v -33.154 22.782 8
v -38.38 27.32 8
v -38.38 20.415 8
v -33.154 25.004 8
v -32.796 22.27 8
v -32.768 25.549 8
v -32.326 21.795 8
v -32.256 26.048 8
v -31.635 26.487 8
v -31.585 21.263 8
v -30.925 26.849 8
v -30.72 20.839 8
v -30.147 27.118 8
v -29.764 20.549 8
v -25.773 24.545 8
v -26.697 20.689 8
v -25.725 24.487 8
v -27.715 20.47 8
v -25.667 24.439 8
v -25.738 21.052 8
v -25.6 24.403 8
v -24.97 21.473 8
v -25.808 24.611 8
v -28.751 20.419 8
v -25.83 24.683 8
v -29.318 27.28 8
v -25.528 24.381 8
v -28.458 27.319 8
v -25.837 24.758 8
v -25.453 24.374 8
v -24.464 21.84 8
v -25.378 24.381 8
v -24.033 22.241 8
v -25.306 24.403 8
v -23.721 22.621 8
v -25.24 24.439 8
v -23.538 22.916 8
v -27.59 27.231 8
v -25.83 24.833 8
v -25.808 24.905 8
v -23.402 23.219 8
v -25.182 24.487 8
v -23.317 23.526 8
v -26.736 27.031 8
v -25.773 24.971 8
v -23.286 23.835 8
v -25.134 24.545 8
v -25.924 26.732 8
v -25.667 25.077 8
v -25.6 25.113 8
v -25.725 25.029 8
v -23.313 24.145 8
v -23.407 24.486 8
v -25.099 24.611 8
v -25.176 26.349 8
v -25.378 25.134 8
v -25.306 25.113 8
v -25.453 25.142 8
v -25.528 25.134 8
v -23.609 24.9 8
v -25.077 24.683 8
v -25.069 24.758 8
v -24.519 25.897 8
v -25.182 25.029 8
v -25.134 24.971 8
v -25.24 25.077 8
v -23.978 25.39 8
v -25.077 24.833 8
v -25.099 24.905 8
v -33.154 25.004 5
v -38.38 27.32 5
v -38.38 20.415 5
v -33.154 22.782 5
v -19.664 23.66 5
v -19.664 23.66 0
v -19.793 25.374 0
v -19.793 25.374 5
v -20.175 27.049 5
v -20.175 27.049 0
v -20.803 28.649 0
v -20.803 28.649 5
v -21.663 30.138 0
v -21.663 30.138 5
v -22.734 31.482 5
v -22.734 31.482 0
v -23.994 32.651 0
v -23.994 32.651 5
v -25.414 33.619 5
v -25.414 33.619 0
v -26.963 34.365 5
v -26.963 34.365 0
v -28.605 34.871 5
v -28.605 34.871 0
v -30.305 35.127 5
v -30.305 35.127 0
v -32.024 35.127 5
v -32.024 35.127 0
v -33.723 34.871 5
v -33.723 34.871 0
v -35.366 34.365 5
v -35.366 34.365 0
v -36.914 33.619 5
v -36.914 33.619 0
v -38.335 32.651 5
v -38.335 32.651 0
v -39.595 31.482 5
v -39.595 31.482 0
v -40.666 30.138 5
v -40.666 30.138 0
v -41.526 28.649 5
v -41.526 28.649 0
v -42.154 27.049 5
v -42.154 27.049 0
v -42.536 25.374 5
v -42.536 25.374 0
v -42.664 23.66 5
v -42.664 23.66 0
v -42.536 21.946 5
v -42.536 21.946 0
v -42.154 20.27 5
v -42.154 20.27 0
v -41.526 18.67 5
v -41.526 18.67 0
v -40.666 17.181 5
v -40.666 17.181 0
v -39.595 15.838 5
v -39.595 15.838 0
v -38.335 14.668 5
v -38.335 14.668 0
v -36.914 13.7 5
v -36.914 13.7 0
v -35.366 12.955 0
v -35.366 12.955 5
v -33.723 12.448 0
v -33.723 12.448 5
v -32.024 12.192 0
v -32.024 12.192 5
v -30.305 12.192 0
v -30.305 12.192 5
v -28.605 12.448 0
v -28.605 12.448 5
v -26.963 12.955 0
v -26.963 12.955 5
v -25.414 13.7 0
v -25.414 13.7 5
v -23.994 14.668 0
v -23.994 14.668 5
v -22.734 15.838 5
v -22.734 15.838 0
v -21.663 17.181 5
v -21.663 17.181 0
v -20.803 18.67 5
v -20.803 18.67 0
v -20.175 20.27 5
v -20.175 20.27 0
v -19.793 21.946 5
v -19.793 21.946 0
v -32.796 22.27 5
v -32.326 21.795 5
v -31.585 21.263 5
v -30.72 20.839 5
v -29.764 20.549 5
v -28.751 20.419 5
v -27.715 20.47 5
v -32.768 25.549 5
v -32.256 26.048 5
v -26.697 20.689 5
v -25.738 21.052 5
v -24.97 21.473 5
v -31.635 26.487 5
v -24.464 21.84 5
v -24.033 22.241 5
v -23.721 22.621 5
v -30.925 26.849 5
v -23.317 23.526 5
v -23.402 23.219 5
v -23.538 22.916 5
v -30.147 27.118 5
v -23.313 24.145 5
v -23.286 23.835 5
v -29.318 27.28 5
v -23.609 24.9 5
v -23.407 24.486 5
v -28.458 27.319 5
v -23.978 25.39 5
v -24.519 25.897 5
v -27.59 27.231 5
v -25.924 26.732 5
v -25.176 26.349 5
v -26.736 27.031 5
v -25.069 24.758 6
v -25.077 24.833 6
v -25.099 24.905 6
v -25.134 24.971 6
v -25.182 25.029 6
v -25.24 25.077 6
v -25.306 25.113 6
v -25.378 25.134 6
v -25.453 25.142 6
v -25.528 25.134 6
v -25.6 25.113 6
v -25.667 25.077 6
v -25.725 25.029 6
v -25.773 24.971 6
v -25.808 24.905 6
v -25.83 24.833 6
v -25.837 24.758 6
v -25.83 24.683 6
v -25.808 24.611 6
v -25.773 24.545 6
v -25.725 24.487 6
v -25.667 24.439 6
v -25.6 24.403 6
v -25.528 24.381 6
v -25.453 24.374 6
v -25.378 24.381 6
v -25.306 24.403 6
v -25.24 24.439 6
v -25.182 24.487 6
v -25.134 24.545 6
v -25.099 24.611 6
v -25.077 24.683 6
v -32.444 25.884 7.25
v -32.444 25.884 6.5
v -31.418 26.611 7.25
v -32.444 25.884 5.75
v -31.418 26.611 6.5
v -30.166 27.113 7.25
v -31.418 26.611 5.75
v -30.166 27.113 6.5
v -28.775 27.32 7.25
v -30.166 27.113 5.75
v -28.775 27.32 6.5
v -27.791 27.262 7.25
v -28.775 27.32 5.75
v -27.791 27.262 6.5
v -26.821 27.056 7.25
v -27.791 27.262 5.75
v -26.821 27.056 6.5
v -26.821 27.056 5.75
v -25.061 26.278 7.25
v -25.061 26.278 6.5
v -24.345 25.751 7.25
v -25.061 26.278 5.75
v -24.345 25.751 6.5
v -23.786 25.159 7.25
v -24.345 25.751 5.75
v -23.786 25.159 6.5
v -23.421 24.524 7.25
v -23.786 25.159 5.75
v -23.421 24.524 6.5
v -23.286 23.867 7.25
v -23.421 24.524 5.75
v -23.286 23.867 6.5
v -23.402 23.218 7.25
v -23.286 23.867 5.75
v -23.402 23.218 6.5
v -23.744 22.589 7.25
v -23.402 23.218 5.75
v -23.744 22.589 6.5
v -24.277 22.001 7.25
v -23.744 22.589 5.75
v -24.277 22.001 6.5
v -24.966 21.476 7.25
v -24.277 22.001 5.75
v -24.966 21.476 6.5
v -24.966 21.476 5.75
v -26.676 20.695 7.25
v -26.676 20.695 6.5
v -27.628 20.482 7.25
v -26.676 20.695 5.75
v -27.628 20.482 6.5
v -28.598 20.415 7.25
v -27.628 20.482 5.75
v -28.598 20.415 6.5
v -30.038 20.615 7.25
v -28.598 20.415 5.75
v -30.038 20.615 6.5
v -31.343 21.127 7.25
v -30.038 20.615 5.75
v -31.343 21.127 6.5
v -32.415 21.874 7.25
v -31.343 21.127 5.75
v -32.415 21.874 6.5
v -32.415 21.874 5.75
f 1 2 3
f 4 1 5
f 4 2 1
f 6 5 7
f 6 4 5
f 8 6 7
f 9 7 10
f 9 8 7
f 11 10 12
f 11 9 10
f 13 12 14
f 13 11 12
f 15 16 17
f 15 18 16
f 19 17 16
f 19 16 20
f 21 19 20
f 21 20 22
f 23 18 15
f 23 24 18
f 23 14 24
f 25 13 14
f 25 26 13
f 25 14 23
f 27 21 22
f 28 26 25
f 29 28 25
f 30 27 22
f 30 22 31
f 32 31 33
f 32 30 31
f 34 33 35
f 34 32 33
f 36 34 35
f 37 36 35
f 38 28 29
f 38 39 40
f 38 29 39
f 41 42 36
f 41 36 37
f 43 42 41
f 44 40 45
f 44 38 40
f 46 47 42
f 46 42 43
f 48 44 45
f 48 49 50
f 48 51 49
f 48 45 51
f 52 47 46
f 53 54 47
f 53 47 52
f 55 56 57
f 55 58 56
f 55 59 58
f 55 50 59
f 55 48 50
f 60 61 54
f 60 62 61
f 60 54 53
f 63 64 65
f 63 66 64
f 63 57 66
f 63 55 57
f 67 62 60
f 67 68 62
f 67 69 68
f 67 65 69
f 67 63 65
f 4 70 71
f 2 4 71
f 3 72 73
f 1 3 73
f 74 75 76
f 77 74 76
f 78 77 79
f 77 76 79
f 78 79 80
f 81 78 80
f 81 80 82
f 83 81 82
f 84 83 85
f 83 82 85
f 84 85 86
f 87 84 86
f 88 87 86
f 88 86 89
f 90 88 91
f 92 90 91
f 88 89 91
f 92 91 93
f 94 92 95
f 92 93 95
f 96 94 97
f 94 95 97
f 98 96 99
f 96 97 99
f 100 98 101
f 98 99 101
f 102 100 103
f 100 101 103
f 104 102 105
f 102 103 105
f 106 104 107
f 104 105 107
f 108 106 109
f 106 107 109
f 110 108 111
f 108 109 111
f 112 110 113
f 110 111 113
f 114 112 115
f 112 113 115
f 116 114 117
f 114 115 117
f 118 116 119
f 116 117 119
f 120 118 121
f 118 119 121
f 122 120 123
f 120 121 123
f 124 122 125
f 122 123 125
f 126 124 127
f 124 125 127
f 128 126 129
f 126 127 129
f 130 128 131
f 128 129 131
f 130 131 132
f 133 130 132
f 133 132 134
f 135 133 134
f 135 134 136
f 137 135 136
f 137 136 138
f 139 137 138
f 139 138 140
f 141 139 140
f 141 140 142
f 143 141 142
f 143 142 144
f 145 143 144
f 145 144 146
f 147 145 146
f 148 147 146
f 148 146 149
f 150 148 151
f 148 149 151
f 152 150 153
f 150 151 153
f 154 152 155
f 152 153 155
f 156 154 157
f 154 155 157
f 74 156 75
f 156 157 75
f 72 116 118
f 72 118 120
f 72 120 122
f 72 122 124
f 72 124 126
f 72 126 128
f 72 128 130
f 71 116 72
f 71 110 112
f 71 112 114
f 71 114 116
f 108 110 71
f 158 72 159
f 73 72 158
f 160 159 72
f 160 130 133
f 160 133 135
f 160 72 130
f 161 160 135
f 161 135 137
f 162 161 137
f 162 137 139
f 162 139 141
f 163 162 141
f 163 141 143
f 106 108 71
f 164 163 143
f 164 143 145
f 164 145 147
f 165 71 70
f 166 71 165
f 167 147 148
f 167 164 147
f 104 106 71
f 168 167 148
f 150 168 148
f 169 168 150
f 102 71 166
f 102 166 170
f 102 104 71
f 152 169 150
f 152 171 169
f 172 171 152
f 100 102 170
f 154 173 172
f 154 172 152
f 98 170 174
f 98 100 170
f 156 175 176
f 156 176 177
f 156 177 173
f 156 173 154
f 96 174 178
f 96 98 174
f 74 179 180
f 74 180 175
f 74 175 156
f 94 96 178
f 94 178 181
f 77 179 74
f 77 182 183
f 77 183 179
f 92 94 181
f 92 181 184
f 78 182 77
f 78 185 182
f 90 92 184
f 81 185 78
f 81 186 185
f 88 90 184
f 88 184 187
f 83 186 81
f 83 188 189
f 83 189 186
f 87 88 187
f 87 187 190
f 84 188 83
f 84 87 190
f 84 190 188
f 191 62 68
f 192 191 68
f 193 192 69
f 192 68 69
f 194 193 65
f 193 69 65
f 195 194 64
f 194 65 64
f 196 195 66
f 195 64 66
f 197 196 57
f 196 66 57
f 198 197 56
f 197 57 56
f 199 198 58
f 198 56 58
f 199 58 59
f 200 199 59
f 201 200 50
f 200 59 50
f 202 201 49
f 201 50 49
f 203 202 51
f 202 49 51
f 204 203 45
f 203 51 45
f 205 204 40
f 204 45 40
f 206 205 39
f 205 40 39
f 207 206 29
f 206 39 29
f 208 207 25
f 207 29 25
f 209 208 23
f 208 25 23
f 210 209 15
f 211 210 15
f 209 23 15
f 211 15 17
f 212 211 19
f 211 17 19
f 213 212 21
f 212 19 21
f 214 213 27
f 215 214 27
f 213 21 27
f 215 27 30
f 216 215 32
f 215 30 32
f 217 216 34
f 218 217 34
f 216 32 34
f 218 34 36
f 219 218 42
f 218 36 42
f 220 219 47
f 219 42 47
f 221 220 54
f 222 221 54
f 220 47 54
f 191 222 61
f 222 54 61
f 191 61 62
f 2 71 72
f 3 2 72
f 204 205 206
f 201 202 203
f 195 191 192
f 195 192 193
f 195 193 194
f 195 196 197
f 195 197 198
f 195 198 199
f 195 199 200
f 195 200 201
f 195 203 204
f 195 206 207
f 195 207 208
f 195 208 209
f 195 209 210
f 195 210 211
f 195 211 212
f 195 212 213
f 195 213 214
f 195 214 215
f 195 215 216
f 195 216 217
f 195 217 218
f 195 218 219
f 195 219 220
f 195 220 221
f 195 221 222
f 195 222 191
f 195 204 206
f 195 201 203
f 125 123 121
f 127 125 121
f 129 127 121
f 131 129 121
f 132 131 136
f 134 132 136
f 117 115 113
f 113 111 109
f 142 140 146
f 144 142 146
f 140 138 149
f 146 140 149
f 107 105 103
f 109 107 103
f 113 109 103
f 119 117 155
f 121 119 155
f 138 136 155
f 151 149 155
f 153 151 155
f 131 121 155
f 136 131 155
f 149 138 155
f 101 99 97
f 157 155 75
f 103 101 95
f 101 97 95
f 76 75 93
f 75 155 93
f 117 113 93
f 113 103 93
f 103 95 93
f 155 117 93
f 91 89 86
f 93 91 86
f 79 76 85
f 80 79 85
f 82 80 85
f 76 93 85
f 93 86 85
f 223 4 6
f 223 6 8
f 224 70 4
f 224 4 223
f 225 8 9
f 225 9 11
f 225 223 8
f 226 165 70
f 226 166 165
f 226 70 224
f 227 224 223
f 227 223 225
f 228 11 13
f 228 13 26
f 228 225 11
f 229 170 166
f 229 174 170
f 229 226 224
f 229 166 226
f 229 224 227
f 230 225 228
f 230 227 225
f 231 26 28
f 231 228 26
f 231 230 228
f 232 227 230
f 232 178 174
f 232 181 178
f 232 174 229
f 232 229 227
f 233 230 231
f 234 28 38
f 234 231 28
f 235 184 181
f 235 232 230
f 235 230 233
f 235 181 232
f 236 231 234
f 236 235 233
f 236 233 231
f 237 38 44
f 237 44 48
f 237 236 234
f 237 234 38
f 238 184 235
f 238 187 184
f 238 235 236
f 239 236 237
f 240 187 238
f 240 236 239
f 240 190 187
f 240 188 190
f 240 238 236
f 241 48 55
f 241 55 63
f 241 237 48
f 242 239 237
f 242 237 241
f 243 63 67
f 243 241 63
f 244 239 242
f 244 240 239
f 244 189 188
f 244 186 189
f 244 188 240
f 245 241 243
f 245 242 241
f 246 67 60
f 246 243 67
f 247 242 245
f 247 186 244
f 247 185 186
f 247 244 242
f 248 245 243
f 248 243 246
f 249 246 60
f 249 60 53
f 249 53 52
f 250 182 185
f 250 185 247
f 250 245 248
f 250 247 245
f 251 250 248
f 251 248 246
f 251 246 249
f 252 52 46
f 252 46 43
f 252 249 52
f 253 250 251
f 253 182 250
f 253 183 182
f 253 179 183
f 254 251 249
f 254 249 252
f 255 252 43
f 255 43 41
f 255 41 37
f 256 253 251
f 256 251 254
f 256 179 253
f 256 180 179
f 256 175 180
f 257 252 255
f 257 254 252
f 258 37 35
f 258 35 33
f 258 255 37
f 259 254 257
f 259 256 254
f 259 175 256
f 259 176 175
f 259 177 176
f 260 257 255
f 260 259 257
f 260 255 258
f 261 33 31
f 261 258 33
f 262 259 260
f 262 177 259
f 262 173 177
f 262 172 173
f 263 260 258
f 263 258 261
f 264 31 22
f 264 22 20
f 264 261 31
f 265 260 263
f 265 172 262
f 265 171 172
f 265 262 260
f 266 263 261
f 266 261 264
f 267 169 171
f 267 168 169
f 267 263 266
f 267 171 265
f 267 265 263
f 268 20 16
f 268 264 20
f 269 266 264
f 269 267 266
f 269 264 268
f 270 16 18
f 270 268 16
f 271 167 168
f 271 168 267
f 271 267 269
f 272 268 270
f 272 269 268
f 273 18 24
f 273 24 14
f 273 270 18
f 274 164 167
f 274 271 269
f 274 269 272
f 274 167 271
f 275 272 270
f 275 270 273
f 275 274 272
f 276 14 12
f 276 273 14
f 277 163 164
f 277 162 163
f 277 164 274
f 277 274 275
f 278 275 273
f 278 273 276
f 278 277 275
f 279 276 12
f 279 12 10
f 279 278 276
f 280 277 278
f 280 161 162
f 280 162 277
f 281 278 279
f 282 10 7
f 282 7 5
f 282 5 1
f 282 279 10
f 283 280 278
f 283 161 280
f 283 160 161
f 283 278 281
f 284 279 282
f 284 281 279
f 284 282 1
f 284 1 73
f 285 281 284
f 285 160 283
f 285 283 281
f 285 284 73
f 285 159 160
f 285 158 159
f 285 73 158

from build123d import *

# Parameters (mm, degrees)
F0_R     = 11.5
F1_DEPTH = 5
F3_DEPTH = 3
F4_R     = 0.3838948085
F5_DEPTH = 2


with BuildPart() as f1:
    # F0 (on Top) → F1 (new body)
    with BuildSketch(Plane.XY):
        with Locations((-31.1644673347, 23.6595552415)):
            Circle(F0_R)
    extrude(amount=F1_DEPTH)

    # F2 (on face) → F3 (join)
    with BuildSketch(Plane.XY.offset(5)):
        with BuildLine():
            add(Edge.make_bspline(
                [(-33.1539588035, 22.7823868875), (-33.3507914741, 23.1327616424), (-33.4622053799, 23.4998701067), (-33.4669202566, 23.8672532141)],
                knots=[0.9471889438, 0.9471889438, 0.9471889438, 0.9471889438, 1, 1, 1, 1], degree=3))
            add(Edge.make_bspline(
                [(-33.4669202566, 23.8672532141), (-33.47186302, 24.2523932514), (-33.3595432056, 24.6378351224), (-33.1539588035, 25.0042262209)],
                knots=[0, 0, 0, 0, 0.0553636021, 0.0553636021, 0.0553636021, 0.0553636021], degree=3))
            Line((-33.1539588035, 25.0042262209), (-38.3802689612, 27.3198802024))
            Line((-38.3802689612, 27.3198802024), (-38.3802689612, 20.4146262258))
            Line((-38.3802689612, 20.4146262258), (-33.1539588035, 22.7823868875))
        make_face()
        with BuildLine():
            add(Edge.make_bspline(
                [(-33.4669202566, 23.8672532141), (-33.47186302, 24.2523932514), (-33.3595432056, 24.6378351224), (-33.1539588035, 25.0042262209)],
                knots=[0, 0, 0, 0, 0.0553636021, 0.0553636021, 0.0553636021, 0.0553636021], degree=3))
            add(Edge.make_bspline(
                [(-33.1539588035, 22.7823868875), (-33.3507914741, 23.1327616424), (-33.4622053799, 23.4998701067), (-33.4669202566, 23.8672532141)],
                knots=[0.9471889438, 0.9471889438, 0.9471889438, 0.9471889438, 1, 1, 1, 1], degree=3))
            add(Edge.make_bspline(
                [(-33.1539588035, 25.0042262209), (-32.4560794327, 26.2479820054), (-28.2623769018, 28.6711404266), (-20.4801214372, 23.8919640928), (-28.1163432289, 19.0510090022), (-32.4328761402, 21.498813583), (-33.1539588035, 22.7823868875)],
                knots=[0.0553636021, 0.0553636021, 0.0553636021, 0.0553636021, 0.243301575, 0.499995332, 0.7537193486, 0.9471889438, 0.9471889438, 0.9471889438, 0.9471889438], degree=3))
        make_face()
    extrude(amount=F3_DEPTH)

    # F4 (on face) → F5 (cut)
    with BuildSketch(Plane.XY.offset(8)):
        with Locations((-25.4533700645, 24.7579738498)):
            Circle(F4_R)
    extrude(amount=-F5_DEPTH, mode=Mode.SUBTRACT)


solid = f1.part
